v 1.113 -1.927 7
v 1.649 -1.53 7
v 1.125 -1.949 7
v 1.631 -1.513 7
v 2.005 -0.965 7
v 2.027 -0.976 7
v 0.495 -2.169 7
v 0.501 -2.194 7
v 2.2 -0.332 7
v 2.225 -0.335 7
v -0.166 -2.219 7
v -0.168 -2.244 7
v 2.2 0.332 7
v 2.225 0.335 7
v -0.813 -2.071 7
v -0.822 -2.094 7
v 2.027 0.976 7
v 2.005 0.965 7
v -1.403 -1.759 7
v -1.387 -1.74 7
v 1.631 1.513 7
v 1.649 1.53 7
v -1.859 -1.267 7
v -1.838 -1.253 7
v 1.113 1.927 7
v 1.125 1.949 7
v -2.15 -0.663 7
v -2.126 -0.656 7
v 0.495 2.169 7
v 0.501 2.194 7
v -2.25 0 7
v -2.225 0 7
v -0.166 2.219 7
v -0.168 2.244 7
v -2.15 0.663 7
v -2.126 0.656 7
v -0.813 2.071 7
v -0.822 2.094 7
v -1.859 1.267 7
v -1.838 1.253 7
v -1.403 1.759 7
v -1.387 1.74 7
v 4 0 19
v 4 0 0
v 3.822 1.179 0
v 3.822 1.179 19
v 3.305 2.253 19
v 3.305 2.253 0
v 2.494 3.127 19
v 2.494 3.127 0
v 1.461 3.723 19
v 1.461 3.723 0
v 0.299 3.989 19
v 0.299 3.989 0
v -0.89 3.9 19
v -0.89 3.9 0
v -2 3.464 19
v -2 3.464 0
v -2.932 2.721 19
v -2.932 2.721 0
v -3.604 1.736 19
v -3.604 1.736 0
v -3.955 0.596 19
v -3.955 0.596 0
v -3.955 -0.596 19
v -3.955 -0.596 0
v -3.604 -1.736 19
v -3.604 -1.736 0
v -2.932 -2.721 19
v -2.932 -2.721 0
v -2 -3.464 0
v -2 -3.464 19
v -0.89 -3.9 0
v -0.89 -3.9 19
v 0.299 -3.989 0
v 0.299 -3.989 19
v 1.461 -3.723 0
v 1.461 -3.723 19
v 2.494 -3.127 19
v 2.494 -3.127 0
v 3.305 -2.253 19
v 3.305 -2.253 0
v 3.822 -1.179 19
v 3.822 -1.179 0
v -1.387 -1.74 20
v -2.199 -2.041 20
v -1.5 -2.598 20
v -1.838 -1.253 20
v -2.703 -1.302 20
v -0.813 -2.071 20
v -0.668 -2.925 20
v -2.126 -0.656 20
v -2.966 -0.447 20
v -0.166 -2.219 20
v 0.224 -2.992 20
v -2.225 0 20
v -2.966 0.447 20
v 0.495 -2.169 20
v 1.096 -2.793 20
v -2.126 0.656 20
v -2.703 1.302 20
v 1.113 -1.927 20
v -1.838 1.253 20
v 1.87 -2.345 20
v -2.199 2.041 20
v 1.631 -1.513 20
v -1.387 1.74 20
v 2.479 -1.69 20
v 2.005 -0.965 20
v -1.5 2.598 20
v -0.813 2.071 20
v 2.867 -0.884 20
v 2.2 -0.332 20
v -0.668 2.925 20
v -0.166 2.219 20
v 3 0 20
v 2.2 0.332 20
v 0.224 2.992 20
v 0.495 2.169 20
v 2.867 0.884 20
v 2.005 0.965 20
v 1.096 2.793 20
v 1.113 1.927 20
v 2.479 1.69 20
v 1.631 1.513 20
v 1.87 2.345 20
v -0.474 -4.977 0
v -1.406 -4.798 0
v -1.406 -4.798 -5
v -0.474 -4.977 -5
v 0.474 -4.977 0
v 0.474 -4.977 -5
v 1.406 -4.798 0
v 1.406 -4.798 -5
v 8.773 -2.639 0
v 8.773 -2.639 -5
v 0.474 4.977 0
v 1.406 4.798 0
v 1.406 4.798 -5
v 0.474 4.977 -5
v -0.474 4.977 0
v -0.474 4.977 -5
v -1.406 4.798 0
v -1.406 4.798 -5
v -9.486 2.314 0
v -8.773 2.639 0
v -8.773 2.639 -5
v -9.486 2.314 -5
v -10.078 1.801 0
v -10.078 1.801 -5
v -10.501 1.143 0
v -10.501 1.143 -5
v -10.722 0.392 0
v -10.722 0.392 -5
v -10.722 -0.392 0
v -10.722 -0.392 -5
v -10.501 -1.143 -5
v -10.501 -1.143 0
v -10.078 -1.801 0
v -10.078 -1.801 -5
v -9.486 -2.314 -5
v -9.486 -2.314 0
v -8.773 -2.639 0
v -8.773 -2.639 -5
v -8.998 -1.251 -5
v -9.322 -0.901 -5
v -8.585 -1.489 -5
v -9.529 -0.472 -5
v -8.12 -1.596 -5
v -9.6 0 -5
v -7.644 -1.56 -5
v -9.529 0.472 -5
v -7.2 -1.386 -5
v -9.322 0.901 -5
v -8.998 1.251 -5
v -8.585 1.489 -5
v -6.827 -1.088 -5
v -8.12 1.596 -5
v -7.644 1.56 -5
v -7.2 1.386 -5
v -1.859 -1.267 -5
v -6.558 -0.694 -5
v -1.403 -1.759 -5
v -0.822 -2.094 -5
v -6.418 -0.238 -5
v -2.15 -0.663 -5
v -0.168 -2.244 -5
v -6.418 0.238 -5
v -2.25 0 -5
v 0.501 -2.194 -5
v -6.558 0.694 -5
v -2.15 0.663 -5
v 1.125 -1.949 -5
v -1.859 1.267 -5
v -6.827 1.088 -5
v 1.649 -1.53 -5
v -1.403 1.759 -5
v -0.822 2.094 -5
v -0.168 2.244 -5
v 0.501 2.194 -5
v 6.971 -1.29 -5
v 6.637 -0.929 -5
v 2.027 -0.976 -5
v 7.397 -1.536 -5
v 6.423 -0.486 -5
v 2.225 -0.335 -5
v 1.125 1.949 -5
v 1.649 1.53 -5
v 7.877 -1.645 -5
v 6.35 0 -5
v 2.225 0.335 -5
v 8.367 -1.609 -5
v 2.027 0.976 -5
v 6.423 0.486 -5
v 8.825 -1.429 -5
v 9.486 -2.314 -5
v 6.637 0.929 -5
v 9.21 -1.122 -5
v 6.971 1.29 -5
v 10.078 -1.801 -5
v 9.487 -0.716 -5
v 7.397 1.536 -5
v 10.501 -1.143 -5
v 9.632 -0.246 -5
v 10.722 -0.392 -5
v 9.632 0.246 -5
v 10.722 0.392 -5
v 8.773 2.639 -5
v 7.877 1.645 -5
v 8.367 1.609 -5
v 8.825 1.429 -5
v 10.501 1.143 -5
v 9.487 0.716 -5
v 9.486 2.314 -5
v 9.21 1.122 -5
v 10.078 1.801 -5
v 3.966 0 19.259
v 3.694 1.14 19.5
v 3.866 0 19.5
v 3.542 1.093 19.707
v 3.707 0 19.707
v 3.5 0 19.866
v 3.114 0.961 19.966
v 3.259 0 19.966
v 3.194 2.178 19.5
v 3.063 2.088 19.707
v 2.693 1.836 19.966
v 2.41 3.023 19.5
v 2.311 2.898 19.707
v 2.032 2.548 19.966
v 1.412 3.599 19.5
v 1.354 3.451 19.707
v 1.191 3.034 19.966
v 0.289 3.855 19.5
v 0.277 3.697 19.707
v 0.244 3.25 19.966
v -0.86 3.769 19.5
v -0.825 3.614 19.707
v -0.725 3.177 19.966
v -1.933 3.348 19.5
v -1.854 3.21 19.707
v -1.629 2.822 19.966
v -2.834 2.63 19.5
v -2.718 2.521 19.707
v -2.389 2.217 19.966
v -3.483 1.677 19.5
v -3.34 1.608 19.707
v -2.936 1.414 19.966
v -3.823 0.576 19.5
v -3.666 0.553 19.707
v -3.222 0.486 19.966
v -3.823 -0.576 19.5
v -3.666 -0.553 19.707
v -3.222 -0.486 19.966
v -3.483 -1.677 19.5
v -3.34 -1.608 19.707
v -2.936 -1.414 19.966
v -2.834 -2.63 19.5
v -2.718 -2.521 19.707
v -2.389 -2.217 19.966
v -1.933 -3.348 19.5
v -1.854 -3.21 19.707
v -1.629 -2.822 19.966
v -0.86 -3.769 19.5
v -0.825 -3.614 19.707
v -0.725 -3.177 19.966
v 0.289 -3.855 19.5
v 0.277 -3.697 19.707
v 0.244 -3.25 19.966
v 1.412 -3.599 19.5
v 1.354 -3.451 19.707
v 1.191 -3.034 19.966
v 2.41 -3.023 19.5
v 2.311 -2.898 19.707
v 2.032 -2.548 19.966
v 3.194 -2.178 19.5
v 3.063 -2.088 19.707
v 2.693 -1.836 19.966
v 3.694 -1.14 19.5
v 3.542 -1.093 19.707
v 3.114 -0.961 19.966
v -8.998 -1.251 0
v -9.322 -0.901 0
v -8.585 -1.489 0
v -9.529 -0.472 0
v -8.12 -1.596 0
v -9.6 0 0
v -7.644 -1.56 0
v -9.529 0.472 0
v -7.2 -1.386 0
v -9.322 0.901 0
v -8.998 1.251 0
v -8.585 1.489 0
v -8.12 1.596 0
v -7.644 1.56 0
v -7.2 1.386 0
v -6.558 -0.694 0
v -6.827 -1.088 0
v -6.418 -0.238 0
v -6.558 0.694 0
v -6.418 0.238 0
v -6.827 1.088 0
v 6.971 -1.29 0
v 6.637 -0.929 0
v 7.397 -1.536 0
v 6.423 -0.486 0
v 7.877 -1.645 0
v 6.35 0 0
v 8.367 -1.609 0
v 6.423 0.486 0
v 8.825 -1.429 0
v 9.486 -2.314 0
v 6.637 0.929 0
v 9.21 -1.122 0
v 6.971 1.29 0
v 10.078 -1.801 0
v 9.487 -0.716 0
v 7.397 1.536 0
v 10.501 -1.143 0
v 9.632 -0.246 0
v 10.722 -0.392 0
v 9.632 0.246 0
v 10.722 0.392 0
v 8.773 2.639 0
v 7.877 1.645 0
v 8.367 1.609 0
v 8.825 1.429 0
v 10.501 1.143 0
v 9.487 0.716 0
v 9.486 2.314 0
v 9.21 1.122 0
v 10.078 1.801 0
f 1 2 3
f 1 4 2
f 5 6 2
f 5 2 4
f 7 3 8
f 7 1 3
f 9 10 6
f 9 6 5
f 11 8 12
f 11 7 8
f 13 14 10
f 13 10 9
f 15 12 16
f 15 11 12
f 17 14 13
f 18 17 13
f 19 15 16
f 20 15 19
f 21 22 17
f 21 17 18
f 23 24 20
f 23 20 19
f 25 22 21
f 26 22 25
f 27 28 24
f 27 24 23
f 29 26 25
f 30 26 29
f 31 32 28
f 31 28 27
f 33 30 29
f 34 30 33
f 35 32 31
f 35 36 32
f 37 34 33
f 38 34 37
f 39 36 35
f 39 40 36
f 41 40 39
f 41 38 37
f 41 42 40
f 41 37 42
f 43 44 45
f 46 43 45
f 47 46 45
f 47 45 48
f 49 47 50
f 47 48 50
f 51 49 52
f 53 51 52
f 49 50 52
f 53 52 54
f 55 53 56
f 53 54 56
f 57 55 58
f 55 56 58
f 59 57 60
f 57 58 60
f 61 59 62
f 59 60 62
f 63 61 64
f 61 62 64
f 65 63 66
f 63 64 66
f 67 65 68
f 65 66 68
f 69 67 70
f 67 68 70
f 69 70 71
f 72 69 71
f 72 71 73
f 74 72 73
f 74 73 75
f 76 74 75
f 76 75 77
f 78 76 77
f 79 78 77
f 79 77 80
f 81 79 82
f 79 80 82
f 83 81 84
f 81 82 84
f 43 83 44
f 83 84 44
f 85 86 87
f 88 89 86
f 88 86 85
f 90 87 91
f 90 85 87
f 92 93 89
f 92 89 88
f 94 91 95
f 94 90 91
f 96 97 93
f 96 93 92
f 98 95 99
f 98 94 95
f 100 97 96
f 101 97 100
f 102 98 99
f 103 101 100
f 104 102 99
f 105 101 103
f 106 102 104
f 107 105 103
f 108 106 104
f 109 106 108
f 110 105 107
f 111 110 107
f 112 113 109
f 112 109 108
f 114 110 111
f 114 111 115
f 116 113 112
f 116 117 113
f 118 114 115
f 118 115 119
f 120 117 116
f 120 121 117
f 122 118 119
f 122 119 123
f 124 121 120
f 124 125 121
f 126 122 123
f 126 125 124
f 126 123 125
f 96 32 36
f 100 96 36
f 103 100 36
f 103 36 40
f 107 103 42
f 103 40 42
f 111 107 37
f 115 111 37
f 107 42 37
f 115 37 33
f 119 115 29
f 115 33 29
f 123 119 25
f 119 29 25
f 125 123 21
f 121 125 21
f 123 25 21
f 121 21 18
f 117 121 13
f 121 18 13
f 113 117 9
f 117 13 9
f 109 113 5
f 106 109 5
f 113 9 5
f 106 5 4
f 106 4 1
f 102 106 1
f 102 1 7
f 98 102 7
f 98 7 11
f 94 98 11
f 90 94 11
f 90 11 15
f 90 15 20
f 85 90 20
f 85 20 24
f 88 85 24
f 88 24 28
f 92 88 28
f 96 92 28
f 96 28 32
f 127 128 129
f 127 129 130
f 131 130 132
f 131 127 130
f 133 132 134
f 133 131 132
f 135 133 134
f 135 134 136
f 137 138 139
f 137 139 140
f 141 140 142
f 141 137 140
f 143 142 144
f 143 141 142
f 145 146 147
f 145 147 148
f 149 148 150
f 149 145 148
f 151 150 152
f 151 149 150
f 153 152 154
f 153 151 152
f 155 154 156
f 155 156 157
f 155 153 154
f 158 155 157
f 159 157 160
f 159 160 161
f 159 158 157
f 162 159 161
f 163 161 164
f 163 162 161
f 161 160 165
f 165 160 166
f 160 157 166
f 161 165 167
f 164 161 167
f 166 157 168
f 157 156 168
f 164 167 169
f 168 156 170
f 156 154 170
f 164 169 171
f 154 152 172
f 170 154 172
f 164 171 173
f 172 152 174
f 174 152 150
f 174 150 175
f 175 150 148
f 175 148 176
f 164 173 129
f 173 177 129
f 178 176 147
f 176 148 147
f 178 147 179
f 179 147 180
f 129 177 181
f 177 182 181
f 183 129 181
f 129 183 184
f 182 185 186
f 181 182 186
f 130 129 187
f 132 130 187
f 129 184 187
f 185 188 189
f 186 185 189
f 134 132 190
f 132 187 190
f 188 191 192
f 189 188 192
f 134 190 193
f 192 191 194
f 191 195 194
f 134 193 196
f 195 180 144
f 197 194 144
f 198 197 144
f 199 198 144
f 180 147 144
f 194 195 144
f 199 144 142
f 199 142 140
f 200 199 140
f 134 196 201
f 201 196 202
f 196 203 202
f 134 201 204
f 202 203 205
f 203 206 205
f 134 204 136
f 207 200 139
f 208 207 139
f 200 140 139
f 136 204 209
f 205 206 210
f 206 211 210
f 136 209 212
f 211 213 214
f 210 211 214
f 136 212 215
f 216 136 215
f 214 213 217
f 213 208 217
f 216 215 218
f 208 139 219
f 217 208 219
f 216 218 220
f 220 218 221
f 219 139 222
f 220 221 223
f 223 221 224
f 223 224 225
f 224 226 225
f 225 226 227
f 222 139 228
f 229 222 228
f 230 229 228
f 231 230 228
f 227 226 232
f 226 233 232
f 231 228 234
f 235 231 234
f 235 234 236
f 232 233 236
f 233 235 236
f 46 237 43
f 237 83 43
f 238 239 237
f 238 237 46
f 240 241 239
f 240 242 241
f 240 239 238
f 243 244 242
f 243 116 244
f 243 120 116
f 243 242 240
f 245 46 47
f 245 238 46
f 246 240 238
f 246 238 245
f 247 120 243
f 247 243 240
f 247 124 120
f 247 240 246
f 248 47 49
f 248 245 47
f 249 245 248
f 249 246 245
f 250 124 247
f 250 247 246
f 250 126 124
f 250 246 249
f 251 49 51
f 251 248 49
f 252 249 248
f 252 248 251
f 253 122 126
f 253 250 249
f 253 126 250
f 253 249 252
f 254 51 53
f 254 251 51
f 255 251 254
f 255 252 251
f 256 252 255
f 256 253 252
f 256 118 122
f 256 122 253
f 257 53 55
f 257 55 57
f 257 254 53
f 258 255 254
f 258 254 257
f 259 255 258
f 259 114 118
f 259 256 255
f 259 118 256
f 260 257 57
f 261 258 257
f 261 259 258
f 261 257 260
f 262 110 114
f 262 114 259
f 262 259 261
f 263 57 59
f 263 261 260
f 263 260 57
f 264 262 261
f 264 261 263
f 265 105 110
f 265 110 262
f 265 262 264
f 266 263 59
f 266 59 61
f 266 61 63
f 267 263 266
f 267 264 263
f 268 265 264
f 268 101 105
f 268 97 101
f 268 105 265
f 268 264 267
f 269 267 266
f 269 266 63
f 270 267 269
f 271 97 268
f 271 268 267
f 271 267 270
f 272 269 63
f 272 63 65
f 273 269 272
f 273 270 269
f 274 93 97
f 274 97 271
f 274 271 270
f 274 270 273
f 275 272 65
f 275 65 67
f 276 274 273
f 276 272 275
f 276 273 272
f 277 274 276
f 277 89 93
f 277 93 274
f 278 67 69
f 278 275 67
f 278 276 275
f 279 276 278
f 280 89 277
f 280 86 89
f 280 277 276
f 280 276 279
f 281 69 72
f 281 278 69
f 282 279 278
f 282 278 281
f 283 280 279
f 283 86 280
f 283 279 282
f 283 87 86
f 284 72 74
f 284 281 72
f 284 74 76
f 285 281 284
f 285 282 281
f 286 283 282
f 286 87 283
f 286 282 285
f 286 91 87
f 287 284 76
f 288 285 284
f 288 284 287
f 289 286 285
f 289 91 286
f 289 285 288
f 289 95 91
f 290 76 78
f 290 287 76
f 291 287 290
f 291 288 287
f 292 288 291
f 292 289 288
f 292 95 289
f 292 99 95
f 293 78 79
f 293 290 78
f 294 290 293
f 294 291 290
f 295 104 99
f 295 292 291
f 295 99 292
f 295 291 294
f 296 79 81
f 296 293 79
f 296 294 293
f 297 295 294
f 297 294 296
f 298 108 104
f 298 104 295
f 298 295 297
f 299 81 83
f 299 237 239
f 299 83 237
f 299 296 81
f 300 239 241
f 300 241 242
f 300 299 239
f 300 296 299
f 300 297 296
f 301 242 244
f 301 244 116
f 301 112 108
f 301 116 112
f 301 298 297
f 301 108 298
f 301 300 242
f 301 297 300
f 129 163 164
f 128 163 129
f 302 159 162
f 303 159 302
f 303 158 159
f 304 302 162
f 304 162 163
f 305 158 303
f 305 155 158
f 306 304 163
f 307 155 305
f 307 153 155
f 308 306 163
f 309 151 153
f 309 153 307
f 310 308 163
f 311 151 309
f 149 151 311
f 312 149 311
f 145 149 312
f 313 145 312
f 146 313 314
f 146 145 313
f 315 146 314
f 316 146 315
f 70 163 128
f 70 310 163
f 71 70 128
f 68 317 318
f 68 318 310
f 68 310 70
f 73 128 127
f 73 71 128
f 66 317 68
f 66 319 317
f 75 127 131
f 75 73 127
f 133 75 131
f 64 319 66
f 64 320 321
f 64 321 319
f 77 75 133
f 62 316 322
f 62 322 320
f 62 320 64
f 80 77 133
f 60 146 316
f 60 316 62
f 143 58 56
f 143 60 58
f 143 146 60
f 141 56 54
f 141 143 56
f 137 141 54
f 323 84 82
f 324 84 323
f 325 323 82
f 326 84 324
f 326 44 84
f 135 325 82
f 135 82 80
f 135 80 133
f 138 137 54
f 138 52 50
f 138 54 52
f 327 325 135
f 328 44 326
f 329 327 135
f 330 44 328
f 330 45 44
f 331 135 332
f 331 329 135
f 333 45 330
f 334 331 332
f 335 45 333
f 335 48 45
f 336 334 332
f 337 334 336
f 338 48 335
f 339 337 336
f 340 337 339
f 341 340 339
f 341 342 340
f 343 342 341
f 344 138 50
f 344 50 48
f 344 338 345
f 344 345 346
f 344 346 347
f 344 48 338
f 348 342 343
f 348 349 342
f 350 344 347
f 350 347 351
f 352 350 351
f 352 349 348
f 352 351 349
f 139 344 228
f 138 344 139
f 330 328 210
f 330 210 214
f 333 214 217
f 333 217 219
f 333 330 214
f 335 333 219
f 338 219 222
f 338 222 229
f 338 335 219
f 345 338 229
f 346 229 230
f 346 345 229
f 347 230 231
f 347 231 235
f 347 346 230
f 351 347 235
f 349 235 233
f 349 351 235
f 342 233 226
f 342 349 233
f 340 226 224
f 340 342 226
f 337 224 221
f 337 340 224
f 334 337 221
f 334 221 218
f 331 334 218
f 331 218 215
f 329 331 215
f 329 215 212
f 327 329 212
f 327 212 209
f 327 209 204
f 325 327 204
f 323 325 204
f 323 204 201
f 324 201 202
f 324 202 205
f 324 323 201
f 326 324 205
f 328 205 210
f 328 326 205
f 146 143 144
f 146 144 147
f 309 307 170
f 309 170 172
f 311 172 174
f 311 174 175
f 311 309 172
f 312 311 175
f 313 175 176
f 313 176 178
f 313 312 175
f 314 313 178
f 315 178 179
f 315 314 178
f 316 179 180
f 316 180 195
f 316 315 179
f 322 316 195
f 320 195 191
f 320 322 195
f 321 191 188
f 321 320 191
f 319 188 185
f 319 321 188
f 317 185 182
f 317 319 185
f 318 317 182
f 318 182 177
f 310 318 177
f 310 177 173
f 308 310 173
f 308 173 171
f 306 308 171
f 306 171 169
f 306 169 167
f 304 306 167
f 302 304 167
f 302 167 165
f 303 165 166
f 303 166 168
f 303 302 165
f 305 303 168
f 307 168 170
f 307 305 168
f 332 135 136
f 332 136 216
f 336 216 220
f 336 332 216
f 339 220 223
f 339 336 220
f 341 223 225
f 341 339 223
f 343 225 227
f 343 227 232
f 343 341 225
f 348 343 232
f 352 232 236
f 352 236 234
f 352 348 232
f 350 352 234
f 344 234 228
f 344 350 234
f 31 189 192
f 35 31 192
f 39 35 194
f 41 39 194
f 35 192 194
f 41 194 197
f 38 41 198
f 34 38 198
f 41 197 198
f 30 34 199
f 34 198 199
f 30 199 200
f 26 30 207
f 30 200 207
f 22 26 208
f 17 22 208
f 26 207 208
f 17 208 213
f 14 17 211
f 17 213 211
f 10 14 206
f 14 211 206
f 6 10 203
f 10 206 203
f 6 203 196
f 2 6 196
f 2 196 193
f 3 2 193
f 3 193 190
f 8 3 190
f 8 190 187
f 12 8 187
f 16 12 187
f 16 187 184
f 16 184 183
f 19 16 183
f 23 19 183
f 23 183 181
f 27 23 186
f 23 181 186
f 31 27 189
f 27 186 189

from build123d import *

# Parameters (mm, degrees)
SKETCH_1_R          = 4
EXTRUDE_1_DEPTH     = 20
SKETCH_2_R          = 1.65
SKETCH_2_R_2        = 1.6
EXTRUDE_2_DEPTH     = 5
SKETCH_3_R          = 2.25
CUT_EXTRUDE_1_DEPTH = 12
SKETCH_4_R          = 2.225
CUT_EXTRUDE_2_DEPTH = 18.59438831
FILLET_2_R          = 1


with BuildPart() as part:
    # 草图1 → 凸台-拉伸1 (new body)
    with BuildSketch(Plane.XY):
        Circle(SKETCH_1_R)
    extrude(amount=EXTRUDE_1_DEPTH)

    # 草图2 → 凸台-拉伸2 (add)
    with BuildSketch(Plane(origin=(0, 0, 0), x_dir=(-1, 0, 0), z_dir=(0, 0, -1))):
        with BuildLine():
            Line((-8.7734375, 2.638994967), (-1.40625, 4.798172666))
            ThreePointArc((-1.40625, 4.798172666), (0, 5), (1.40625, 4.798172666))
            Line((1.40625, 4.798172666), (8.7734375, 2.638994967))
            ThreePointArc((8.7734375, 2.638994967), (10.75, 0), (8.7734375, -2.638994967))
            Line((8.7734375, -2.638994967), (1.40625, -4.798172666))
            ThreePointArc((1.40625, -4.798172666), (0, -5), (-1.40625, -4.798172666))
            Line((-1.40625, -4.798172666), (-8.7734375, -2.638994967))
            ThreePointArc((-8.7734375, -2.638994967), (-10.75, 0), (-8.7734375, 2.638994967))
        make_face()
        with Locations((-8, 0)):
            Circle(SKETCH_2_R, mode=Mode.SUBTRACT)
        with Locations((8, 0)):
            Circle(SKETCH_2_R_2, mode=Mode.SUBTRACT)
    extrude(amount=EXTRUDE_2_DEPTH)

    # 草图3 → 切除-拉伸1 (cut)
    with BuildSketch(Plane(origin=(0, 0, -5), x_dir=(-1, 0, 0), z_dir=(0, 0, -1))):
        Circle(SKETCH_3_R)
    extrude(amount=-CUT_EXTRUDE_1_DEPTH, mode=Mode.SUBTRACT)

    # 草图4 → 切除-拉伸2 (cut, through all)
    with BuildSketch(Plane(origin=(0, 0, 7), x_dir=(-1, 0, 0), z_dir=(0, 0, -1))):
        Circle(SKETCH_4_R)
    extrude(amount=-CUT_EXTRUDE_2_DEPTH, mode=Mode.SUBTRACT)

    # 圆角2
    fillet_2_edges = [part.edges().sort_by_distance(p)[0] for p in [
        (-4, 0, 20),
    ]]
    fillet(fillet_2_edges, radius=FILLET_2_R)


solid = part.part
